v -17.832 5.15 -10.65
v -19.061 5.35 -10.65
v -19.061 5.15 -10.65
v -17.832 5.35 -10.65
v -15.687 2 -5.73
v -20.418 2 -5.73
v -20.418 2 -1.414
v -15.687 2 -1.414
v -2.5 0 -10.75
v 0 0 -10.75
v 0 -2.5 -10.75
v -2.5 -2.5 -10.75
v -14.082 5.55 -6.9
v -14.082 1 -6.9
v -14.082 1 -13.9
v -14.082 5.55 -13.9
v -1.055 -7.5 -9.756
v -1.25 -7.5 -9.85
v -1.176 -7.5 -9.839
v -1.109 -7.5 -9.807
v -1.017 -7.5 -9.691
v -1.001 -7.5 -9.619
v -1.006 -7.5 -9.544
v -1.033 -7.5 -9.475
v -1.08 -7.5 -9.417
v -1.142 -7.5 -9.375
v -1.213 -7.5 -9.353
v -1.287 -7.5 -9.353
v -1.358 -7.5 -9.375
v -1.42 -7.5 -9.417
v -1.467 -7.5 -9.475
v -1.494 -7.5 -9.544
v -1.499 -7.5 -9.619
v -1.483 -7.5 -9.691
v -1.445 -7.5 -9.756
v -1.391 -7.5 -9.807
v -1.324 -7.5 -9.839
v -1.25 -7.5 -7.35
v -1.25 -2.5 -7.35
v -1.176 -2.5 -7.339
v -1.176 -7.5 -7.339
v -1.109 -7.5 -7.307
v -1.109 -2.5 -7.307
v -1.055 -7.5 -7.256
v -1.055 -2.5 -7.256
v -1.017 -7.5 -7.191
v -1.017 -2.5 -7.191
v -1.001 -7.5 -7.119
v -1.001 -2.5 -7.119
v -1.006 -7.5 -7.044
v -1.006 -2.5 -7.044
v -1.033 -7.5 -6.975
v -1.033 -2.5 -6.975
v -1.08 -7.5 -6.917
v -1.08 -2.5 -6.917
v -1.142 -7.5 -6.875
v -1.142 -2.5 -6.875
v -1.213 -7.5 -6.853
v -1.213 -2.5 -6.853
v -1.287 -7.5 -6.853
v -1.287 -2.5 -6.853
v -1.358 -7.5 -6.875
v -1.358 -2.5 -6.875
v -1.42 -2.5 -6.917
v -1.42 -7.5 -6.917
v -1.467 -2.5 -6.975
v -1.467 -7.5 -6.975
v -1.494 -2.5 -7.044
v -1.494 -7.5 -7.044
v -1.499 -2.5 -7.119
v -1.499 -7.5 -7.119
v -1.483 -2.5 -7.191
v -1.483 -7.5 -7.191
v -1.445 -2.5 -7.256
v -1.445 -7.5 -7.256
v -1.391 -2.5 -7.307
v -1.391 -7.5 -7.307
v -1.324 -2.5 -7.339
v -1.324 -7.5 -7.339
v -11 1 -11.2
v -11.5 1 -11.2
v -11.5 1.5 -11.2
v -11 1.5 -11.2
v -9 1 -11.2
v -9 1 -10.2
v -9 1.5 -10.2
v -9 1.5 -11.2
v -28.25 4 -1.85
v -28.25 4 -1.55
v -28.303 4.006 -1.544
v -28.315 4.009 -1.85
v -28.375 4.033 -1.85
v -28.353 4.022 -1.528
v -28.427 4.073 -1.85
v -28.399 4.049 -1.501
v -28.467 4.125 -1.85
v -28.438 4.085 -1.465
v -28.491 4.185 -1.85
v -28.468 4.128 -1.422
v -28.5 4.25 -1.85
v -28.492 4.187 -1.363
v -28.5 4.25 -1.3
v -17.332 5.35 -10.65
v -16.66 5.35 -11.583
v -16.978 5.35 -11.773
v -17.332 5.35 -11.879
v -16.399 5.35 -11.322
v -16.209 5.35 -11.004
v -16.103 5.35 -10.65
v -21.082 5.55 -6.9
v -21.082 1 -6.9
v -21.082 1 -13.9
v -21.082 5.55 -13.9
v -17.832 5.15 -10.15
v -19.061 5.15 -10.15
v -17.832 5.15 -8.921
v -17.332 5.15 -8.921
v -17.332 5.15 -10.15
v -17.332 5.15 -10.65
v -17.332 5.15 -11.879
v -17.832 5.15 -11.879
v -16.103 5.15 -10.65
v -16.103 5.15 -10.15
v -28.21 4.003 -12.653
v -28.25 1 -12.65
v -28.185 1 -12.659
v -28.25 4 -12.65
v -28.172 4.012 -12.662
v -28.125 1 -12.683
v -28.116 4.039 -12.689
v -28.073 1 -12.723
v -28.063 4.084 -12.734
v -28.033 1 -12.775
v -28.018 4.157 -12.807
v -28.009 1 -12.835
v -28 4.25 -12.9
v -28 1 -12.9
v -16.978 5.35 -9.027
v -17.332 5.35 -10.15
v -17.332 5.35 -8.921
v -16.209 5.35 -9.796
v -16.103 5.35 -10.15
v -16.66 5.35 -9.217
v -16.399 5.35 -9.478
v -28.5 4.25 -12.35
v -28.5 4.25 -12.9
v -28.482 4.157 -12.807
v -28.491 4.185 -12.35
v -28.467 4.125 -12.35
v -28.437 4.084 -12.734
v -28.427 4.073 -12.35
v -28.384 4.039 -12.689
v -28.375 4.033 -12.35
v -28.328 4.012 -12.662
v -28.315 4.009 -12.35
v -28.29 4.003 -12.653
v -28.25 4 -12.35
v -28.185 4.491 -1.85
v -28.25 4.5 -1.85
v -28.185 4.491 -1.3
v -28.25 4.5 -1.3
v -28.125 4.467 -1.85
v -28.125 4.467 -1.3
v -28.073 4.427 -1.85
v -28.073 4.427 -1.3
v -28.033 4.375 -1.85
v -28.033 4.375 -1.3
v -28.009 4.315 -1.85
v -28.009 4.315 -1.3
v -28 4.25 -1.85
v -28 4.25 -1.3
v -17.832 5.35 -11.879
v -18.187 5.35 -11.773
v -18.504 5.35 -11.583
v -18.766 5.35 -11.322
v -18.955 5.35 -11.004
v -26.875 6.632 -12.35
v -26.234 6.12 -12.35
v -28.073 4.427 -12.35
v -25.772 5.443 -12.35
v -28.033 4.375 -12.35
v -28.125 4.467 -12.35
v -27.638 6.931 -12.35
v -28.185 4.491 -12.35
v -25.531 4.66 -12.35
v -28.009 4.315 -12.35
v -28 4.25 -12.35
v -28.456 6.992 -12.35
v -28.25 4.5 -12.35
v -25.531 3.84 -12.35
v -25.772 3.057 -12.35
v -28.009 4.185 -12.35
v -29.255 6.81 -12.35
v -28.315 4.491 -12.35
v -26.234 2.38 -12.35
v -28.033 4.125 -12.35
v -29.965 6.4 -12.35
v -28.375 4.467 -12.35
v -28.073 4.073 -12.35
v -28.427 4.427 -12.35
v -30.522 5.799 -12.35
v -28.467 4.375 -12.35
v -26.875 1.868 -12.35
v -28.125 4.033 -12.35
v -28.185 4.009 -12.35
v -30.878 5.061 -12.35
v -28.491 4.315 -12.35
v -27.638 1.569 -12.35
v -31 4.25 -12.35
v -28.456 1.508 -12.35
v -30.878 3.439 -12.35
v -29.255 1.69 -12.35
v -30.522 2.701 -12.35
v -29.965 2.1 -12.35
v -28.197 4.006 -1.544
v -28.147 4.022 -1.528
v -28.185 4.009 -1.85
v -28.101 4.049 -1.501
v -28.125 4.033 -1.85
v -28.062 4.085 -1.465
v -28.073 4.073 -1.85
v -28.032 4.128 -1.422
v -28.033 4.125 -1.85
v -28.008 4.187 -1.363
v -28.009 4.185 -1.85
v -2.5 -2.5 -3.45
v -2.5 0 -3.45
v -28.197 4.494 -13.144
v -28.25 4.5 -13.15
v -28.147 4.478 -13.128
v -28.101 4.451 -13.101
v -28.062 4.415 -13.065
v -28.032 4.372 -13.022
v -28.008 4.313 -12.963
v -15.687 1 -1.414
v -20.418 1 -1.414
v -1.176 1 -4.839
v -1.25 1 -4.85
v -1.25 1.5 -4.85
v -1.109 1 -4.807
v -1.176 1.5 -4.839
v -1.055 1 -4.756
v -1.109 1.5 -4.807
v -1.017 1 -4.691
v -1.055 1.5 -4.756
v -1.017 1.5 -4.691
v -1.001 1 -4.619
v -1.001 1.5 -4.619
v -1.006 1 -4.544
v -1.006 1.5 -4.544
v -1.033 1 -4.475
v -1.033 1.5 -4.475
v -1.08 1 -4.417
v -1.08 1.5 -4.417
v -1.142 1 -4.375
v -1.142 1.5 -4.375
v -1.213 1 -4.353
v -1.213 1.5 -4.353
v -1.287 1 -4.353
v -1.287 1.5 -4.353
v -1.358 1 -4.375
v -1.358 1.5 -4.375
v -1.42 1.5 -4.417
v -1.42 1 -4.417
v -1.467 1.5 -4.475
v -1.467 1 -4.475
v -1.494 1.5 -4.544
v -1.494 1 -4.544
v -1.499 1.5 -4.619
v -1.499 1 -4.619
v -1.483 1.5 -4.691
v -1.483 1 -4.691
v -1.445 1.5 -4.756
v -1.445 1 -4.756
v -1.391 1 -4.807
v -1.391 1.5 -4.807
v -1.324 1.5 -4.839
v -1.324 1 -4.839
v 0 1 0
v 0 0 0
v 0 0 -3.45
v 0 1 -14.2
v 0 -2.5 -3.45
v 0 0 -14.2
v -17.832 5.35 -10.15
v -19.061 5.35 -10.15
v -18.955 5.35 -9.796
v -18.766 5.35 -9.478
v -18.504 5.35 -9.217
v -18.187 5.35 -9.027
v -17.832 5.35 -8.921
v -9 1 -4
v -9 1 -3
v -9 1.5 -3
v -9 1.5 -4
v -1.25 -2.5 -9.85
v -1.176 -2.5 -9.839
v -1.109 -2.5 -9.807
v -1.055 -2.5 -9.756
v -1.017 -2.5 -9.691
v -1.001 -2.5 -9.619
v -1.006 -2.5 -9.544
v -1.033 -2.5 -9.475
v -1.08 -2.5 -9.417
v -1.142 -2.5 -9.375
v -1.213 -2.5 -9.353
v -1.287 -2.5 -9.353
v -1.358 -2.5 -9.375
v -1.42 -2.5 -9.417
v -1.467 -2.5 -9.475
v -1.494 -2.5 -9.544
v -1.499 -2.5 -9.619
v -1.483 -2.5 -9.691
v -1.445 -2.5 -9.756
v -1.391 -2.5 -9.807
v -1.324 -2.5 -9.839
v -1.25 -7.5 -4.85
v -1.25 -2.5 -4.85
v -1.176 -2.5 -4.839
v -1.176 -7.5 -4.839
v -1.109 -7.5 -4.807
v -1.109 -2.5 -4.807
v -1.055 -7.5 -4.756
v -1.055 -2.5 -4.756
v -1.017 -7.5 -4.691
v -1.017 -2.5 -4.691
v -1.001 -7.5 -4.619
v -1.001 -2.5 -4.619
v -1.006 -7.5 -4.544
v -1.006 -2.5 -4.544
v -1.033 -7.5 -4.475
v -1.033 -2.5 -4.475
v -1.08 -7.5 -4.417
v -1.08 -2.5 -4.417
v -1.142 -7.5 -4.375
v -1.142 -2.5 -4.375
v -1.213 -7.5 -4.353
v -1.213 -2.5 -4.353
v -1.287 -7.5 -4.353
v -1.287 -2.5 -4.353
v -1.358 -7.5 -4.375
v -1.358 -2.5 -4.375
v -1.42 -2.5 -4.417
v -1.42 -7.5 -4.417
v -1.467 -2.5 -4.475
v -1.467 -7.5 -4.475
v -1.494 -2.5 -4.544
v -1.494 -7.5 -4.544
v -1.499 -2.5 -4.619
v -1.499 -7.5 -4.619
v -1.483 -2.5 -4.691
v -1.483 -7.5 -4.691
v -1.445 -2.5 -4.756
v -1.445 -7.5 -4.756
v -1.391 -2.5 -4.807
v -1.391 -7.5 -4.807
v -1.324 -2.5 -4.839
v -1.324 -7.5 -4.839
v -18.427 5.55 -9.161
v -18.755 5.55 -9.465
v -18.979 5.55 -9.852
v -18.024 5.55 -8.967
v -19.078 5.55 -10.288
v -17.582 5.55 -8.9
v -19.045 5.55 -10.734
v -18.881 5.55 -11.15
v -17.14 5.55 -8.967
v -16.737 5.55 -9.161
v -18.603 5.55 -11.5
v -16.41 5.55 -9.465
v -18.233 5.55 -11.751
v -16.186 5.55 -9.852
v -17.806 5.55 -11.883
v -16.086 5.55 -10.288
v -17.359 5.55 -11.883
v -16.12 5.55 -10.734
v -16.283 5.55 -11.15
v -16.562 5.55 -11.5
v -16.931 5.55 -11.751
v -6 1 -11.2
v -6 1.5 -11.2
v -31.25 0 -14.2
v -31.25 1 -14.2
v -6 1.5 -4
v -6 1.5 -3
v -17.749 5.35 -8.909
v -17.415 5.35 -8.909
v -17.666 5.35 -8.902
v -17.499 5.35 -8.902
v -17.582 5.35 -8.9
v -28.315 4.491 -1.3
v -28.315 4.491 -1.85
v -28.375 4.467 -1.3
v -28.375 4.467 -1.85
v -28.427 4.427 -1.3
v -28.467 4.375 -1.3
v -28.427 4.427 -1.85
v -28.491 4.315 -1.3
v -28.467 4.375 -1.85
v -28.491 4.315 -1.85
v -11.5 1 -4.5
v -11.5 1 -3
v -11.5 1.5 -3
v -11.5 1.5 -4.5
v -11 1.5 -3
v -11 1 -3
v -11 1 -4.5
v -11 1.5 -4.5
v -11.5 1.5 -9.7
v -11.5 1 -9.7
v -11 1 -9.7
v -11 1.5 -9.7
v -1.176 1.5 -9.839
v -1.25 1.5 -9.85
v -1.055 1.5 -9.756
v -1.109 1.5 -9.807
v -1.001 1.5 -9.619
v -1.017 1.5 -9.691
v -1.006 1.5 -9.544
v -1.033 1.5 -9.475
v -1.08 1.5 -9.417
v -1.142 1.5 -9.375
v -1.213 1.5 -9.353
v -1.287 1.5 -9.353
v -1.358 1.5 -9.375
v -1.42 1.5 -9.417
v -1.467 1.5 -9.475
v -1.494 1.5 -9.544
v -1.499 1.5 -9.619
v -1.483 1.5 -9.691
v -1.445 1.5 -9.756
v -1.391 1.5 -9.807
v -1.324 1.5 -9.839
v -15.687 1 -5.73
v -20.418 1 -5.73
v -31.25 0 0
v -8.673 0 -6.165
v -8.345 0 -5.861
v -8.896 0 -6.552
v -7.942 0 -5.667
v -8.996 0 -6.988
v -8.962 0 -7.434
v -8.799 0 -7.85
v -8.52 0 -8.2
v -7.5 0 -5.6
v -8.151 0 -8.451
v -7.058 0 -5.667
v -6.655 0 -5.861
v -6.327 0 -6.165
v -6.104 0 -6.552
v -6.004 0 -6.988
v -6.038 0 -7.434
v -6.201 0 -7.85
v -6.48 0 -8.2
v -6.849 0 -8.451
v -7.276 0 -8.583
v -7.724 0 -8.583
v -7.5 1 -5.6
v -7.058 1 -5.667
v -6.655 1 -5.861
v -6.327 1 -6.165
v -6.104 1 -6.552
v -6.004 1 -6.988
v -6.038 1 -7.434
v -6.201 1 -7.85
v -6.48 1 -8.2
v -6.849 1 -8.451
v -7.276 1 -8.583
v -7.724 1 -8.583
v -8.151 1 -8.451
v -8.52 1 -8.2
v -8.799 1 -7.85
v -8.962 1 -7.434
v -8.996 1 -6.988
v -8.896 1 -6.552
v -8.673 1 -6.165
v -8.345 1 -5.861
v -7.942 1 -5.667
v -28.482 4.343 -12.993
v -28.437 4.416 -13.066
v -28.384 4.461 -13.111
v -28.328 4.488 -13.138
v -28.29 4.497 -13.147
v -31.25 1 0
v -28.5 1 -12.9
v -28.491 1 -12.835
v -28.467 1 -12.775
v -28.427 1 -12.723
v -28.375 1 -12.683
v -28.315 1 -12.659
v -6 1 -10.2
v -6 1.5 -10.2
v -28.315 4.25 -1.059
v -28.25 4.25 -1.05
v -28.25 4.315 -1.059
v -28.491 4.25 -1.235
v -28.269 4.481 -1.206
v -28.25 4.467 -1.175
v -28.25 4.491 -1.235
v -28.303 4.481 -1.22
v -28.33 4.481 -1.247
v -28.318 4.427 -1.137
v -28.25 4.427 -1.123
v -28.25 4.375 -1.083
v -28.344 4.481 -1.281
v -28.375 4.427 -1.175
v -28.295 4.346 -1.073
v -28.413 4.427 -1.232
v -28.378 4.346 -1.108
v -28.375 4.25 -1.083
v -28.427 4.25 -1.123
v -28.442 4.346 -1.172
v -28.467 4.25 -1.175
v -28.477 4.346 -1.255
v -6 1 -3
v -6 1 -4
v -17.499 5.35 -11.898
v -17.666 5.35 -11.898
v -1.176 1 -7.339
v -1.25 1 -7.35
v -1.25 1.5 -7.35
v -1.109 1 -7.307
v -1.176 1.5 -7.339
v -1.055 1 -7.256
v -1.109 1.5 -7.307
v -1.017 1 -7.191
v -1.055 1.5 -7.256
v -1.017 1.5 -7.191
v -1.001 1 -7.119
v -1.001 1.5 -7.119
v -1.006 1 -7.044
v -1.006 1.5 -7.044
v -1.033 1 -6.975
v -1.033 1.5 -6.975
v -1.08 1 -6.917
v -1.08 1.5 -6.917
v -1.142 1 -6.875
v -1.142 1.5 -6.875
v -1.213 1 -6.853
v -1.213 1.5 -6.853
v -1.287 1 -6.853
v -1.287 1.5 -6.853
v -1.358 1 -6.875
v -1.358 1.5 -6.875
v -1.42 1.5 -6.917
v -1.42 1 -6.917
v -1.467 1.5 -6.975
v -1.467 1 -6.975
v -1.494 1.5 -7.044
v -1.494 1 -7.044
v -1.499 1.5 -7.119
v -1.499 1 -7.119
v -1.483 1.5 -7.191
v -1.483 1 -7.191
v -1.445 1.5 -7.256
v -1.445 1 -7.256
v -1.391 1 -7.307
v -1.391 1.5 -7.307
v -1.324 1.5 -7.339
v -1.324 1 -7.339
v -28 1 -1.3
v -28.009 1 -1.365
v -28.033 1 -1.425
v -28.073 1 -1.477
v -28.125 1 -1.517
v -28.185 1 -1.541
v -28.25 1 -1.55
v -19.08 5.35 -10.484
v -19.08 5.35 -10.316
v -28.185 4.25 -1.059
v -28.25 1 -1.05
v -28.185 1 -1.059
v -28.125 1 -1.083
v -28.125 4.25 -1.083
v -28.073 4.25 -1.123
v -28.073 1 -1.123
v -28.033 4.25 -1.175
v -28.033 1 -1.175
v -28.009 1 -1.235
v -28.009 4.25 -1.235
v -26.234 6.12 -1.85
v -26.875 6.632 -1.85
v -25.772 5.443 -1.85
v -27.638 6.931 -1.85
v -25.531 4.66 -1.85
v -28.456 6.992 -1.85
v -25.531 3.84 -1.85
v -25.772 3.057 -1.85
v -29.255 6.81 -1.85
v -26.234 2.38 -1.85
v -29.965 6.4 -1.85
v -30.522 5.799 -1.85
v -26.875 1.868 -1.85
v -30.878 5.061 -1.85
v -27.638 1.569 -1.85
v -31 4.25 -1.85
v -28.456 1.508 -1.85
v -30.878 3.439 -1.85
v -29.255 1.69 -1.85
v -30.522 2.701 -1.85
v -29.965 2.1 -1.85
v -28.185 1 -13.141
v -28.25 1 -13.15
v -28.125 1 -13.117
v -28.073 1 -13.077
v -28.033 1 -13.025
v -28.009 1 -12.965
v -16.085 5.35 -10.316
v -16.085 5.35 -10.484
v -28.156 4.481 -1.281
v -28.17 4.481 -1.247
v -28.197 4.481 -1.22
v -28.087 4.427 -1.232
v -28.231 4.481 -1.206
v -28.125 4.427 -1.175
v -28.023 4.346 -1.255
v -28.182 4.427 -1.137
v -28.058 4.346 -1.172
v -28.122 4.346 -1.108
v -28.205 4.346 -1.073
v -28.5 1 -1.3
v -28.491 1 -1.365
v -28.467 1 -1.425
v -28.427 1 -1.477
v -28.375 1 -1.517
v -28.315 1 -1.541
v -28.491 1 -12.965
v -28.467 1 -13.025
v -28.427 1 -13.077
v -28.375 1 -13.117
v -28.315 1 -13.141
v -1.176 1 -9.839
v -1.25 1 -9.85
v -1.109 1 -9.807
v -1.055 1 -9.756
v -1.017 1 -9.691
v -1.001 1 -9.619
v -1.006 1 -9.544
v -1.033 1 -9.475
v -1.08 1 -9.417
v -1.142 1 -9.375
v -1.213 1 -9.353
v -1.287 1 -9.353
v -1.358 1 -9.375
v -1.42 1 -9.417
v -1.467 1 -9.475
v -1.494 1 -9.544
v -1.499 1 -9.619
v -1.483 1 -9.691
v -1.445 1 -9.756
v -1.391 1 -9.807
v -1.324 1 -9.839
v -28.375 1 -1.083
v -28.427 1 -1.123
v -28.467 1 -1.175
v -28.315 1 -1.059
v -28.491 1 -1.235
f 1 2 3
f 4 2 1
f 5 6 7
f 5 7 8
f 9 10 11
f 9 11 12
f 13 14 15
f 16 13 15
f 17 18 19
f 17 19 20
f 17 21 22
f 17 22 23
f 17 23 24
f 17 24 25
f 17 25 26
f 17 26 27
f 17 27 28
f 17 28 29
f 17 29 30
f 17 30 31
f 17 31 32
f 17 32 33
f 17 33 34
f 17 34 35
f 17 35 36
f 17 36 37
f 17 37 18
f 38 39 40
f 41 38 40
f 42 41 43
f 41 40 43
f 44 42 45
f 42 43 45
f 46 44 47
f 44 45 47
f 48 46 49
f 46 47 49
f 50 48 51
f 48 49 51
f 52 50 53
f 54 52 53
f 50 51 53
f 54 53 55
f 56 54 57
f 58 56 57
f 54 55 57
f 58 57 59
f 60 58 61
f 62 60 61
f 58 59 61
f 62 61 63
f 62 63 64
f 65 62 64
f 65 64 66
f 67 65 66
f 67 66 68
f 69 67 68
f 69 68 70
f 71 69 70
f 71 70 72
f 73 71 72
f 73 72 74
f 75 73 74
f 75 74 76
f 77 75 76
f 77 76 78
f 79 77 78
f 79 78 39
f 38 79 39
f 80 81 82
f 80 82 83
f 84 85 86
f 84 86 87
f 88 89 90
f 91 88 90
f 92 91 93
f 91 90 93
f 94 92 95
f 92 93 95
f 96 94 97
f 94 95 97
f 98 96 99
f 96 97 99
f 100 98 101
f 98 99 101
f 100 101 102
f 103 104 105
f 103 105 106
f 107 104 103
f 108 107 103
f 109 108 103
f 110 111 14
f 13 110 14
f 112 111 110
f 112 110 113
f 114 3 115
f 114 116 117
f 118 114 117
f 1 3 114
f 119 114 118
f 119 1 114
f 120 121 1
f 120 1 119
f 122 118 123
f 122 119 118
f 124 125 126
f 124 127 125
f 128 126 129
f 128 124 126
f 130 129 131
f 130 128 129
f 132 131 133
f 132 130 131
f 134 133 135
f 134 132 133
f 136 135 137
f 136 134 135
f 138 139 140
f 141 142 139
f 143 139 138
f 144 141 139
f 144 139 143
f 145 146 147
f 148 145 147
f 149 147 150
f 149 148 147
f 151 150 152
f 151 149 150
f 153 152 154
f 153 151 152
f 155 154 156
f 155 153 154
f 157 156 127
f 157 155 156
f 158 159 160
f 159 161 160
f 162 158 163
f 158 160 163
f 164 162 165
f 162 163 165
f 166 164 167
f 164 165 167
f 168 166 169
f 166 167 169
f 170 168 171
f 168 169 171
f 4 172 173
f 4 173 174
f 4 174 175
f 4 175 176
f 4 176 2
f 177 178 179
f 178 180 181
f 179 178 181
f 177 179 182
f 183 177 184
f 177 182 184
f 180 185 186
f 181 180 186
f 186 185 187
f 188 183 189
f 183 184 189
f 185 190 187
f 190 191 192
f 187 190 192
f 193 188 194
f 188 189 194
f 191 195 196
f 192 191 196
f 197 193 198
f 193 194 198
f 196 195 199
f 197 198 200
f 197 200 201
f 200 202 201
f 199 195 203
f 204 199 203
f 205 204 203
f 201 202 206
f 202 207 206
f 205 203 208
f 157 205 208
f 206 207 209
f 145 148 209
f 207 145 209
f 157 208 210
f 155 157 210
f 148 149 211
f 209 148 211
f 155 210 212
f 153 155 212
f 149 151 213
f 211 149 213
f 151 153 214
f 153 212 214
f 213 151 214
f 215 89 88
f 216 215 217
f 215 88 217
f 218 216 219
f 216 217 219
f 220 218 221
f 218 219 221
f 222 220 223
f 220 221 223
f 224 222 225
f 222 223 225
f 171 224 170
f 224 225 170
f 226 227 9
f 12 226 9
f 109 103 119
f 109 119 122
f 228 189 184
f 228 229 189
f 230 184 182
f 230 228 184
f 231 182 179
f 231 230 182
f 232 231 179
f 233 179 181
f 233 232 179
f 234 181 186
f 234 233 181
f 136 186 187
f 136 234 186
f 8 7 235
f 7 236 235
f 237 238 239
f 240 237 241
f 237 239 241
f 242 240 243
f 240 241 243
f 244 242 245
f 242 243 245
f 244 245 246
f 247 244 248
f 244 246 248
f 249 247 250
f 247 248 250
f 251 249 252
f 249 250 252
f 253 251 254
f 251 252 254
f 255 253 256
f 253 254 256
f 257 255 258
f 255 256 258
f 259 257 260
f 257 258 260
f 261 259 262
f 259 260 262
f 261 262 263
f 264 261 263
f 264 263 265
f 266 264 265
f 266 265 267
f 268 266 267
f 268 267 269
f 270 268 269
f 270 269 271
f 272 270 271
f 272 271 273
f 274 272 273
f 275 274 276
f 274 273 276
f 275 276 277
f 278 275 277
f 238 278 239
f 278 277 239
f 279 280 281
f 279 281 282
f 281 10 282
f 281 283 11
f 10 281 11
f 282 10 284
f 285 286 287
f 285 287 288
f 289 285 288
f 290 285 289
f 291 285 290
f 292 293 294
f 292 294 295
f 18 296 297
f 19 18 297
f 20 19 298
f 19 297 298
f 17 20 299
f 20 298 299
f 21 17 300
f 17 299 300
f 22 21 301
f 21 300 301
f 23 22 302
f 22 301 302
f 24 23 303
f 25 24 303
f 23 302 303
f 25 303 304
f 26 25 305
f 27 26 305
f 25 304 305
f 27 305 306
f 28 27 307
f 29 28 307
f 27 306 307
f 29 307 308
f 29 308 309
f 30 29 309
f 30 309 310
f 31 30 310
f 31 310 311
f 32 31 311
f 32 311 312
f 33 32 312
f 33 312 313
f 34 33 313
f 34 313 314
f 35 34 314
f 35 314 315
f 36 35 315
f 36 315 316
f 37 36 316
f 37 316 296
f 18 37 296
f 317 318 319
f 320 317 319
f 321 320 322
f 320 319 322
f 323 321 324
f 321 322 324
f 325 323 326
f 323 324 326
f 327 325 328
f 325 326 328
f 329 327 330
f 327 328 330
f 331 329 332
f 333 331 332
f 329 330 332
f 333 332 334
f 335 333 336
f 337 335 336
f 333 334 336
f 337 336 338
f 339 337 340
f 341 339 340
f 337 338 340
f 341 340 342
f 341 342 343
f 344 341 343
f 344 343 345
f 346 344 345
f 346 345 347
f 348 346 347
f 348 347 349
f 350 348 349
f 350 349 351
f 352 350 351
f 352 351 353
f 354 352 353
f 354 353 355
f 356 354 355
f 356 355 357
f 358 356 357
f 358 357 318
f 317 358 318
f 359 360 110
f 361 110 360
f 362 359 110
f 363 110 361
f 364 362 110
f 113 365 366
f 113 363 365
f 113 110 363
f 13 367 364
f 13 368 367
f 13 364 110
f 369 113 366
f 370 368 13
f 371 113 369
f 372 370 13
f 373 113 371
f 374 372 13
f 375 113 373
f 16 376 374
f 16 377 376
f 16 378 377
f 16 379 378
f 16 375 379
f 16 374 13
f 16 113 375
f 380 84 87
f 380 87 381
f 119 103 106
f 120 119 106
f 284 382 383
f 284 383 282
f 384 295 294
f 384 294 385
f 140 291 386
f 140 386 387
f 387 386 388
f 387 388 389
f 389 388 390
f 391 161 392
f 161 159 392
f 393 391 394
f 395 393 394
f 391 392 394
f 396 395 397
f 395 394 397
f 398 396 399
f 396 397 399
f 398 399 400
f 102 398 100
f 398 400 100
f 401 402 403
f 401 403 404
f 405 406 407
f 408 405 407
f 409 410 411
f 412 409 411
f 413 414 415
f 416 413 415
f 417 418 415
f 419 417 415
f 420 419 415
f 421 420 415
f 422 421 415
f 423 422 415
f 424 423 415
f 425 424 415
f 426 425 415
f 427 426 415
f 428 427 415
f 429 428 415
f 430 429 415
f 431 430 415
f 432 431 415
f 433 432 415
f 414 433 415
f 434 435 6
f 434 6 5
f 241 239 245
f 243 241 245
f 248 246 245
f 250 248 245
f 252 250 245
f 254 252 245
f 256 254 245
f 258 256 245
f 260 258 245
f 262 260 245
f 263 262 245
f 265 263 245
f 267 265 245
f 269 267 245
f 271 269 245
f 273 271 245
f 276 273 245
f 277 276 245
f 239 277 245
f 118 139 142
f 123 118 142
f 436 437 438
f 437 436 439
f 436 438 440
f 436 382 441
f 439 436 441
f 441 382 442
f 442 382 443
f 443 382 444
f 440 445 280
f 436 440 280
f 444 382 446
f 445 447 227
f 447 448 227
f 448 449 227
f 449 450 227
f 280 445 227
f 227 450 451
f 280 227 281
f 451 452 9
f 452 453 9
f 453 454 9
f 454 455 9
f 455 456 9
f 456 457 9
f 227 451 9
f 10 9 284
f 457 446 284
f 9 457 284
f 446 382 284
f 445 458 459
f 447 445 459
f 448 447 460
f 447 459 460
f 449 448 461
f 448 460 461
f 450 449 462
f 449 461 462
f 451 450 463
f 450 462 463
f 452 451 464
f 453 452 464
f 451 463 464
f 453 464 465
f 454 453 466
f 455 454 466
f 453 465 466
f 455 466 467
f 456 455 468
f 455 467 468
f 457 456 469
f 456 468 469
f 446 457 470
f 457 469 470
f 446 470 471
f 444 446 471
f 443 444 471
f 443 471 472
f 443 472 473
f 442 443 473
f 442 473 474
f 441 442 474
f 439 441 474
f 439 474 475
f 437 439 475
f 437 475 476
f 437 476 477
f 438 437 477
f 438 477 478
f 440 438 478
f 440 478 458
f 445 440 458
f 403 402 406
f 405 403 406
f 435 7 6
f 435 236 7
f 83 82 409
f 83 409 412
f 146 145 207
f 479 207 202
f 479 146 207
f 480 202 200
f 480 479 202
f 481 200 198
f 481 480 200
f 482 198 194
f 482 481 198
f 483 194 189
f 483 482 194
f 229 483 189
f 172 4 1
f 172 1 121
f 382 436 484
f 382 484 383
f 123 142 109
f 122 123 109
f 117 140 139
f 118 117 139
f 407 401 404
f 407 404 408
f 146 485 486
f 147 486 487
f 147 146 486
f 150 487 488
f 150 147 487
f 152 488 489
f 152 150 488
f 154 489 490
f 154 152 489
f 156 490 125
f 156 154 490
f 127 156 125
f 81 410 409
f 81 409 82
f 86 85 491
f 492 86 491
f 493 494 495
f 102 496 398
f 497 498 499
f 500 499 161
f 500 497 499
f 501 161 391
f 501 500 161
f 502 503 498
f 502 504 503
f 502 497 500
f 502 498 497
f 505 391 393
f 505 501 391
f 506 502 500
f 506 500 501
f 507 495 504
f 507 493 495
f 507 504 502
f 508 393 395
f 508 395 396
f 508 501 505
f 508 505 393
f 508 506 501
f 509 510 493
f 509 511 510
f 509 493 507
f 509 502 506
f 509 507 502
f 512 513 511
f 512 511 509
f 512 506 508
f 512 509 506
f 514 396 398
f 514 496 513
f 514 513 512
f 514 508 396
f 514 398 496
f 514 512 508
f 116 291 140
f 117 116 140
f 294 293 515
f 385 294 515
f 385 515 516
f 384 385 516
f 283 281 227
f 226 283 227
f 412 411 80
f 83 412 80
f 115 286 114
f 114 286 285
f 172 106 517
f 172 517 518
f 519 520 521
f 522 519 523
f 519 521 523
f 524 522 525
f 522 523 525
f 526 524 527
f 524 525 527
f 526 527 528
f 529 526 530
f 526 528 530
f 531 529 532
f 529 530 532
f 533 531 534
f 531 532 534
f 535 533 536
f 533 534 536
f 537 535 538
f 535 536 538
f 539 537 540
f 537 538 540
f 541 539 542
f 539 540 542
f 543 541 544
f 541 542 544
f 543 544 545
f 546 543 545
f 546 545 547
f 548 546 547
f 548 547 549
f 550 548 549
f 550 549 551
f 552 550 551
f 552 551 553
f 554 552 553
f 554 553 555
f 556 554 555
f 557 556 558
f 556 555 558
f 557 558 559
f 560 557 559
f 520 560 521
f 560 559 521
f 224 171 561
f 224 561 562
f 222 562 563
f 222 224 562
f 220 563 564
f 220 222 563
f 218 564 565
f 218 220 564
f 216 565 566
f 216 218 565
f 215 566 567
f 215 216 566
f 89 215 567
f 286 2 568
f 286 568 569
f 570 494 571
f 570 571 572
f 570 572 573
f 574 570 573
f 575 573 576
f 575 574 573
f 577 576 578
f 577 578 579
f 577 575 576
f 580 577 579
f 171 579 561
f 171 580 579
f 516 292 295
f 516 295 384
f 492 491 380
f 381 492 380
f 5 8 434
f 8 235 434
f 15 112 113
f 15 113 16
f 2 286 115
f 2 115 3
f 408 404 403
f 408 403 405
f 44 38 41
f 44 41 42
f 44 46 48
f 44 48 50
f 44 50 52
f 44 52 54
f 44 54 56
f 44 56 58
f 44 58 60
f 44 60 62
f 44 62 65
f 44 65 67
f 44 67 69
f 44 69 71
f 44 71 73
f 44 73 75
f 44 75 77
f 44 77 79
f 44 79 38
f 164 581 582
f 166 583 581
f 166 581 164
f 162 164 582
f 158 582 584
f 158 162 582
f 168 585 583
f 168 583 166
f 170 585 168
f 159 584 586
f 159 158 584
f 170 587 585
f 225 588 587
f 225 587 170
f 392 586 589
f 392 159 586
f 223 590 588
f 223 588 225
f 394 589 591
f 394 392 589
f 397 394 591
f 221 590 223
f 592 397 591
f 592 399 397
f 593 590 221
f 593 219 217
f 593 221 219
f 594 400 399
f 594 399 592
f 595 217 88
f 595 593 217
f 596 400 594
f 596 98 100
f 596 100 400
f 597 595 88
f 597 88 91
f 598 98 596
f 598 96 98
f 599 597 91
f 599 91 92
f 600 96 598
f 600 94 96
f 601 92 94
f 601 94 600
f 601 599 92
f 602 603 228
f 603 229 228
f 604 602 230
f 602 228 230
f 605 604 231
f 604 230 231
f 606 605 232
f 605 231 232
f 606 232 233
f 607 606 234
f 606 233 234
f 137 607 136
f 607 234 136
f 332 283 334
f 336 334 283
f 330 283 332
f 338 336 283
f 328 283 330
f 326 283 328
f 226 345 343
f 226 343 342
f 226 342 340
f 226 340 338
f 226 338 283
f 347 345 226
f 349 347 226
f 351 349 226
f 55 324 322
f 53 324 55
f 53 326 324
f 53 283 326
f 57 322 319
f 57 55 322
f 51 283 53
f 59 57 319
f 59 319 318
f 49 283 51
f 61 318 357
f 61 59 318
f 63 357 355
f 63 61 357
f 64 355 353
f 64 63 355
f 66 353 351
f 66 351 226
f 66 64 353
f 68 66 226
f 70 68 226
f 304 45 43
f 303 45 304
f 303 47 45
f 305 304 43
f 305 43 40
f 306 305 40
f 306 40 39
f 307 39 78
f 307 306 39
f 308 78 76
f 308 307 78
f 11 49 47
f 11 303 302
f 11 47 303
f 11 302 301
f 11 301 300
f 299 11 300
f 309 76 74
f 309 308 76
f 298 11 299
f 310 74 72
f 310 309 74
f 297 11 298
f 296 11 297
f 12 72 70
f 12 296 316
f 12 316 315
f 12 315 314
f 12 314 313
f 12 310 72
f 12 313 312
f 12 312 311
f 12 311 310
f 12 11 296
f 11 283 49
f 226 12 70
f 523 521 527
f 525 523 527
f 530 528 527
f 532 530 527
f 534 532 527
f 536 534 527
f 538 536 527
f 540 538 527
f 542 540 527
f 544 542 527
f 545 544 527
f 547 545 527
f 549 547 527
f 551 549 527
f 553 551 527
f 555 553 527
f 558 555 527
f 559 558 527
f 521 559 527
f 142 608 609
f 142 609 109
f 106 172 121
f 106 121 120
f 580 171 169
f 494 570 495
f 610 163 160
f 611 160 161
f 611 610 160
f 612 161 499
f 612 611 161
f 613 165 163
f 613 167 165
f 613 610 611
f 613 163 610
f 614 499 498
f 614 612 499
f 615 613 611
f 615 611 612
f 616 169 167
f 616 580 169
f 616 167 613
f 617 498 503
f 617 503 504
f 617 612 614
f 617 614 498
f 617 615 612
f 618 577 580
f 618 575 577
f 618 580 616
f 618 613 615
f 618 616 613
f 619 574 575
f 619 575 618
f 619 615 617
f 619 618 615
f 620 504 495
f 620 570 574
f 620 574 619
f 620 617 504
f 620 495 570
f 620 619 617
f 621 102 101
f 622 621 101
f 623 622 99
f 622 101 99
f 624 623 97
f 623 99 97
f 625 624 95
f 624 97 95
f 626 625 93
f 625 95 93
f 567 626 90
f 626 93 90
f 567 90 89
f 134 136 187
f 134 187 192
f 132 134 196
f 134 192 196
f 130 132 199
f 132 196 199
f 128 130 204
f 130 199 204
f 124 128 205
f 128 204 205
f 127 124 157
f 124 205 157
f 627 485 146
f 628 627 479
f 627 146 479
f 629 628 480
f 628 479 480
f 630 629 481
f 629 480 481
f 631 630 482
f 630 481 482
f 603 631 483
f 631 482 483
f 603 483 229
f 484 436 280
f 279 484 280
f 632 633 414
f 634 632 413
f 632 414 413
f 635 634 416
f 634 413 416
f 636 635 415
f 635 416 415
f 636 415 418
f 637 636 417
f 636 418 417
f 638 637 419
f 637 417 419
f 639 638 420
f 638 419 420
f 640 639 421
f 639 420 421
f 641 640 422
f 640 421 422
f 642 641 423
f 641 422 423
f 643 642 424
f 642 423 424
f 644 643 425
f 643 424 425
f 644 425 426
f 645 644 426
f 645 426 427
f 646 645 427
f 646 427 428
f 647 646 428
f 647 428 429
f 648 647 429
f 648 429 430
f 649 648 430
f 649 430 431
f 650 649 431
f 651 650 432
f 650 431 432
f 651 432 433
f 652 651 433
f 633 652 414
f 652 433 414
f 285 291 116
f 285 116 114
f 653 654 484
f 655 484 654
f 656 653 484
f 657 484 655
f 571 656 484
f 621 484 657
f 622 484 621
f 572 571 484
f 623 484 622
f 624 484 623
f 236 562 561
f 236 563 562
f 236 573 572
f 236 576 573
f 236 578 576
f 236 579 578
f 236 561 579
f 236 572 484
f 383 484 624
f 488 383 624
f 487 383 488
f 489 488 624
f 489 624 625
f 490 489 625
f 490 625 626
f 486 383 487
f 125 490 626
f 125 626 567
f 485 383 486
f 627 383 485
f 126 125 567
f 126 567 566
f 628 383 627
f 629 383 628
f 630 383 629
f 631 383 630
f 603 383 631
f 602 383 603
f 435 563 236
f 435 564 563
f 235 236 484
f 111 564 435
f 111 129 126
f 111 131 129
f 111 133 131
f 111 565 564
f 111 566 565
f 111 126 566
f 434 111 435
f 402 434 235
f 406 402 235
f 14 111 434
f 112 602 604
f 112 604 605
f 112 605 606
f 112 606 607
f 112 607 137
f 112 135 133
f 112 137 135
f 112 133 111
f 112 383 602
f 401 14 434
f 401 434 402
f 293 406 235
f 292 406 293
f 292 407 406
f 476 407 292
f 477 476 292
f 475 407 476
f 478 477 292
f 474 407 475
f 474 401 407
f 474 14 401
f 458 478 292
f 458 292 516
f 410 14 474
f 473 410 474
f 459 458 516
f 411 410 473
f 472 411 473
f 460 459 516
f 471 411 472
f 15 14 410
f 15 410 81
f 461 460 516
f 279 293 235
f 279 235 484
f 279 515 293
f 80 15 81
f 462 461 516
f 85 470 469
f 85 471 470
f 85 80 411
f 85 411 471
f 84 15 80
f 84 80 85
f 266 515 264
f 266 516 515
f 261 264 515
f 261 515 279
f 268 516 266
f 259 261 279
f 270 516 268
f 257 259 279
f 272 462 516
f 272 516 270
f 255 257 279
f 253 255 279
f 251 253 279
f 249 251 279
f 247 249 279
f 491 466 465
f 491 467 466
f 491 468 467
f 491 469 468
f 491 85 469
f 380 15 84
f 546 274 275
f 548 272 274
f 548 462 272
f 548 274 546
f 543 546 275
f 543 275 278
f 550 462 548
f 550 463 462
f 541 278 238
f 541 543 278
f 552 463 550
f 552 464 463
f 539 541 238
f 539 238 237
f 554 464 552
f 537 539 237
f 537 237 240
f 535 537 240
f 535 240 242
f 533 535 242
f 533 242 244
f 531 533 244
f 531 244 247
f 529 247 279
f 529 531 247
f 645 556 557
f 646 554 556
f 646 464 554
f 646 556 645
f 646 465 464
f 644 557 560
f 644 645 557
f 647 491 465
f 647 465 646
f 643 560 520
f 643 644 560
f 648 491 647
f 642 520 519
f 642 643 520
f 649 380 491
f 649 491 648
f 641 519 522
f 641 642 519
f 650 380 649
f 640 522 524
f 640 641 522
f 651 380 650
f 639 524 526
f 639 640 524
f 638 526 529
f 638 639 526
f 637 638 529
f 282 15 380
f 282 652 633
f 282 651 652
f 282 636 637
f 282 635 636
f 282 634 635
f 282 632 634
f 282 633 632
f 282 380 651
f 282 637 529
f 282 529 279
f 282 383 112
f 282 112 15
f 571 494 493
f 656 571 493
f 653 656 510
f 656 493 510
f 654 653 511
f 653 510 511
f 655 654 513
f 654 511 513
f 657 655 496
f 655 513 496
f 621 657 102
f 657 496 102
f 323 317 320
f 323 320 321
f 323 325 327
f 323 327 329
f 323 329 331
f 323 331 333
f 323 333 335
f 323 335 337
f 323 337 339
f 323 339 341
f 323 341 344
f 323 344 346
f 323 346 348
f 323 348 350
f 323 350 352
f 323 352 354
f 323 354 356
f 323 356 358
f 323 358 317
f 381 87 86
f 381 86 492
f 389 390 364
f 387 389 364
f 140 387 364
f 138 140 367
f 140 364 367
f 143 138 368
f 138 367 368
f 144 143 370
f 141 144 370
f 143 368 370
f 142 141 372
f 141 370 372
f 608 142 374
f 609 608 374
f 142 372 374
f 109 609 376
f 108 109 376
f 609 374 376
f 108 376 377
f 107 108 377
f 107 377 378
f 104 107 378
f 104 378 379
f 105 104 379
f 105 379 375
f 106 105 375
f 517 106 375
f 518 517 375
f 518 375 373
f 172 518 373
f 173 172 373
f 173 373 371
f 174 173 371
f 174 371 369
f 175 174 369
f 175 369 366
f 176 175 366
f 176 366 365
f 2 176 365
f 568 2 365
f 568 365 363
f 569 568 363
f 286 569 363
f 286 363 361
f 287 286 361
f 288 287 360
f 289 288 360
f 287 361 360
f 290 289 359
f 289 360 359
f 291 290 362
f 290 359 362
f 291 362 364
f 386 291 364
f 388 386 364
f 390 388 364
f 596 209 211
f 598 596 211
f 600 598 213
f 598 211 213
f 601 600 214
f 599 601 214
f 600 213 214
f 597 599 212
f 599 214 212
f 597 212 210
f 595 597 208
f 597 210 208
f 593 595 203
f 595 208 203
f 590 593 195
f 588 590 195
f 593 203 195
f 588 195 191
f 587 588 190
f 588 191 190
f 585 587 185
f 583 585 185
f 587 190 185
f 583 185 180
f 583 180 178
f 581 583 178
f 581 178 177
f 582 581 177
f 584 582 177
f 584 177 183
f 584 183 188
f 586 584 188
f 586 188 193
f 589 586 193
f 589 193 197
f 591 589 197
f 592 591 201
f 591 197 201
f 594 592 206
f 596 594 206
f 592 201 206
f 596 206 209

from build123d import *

# Parameters (mm, degrees)
ESQUISSE1_W              = 31.25
ESQUISSE1_H              = 14.2
BOSS_EXTRU_1_DEPTH       = 1
ESQUISSE2_W              = 0.5
ESQUISSE2_H              = 0.5
BOSS_EXTRU_2_DEPTH       = 3.5
ESQUISSE3_W              = 0.5
ESQUISSE3_H              = 0.5
BOSS_EXTRU_3_DEPTH       = 0.3
ESQUISSE4_W              = 0.5
ESQUISSE4_H              = 0.5
BOSS_EXTRU_4_DEPTH       = 0.3
ESQUISSE5_R              = 2.75
BOSS_EXTRU_5_DEPTH       = 10.5
ESQUISSE6_W              = 7
ESQUISSE6_H              = 7
BOSS_EXTRU_6_DEPTH       = 4.55
ESQUISSE7_R              = 1.5
ENL_V_MAT_EXTRU_1_DEPTH  = 0.2
ESQUISSE8_W              = 1.229019946
ESQUISSE8_H              = 0.5
ESQUISSE8_W_2            = 0.5
ESQUISSE8_H_2            = 1.229019946
ENL_V_MAT_EXTRU_2_DEPTH  = 0.2
ESQUISSE9_W              = 4.73100796
ESQUISSE9_H              = 4.316007262
ESQUISSE9_W_2            = 3
ESQUISSE9_H_2            = 1
ESQUISSE9_W_3            = 0.5
ESQUISSE9_H_3            = 1.5
BOSS_EXTRU_7_DEPTH       = 0.5
ESQUISSE10_W             = 4.73100796
ESQUISSE10_H             = 4.316007262
BOSS_EXTRU_8_DEPTH       = 0.5
ESQUISSE11_R             = 1.5
ENL_V_MAT_EXTRU_3_DEPTH  = 22.5
ESQUISSE12_W             = 2.5
ESQUISSE12_H             = 7.3
BOSS_EXTRU_9_DEPTH       = 2.5
BOSS_EXTRU_10_DEPTH      = 5
BOSS_EXTRU_10_DEPTH_BACK = 4
ESQUISSE13_R             = 0.25
CONG_1_R                 = 0.25
CONG_2_R                 = 0.25
CONG_3_R                 = 0.25


with BuildPart() as part:
    # Esquisse1 → Boss.-Extru.1 (new body)
    with BuildSketch(Plane(origin=(0, 0, 0), x_dir=(1, 0, 0), z_dir=(0, 1, 0))):
        with Locations((-15.625, 7.1)):
            Rectangle(ESQUISSE1_W, ESQUISSE1_H)
    extrude(amount=BOSS_EXTRU_1_DEPTH)

    # Esquisse2 → Boss.-Extru.2 (add)
    with BuildSketch(Plane(origin=(0, 1, 0), x_dir=(1, 0, 0), z_dir=(0, 1, 0))):
        with Locations((-28.25, 12.9)):
            Rectangle(ESQUISSE2_W, ESQUISSE2_H)
        with Locations((-28.25, 1.3)):
            Rectangle(ESQUISSE2_W, ESQUISSE2_H)
    extrude(amount=BOSS_EXTRU_2_DEPTH)

    # Esquisse3 → Boss.-Extru.3 (add)
    with BuildSketch(Plane.XY.offset(-12.65)):
        with Locations((-28.25, 4.25)):
            Rectangle(ESQUISSE3_W, ESQUISSE3_H)
    extrude(amount=BOSS_EXTRU_3_DEPTH)

    # Esquisse4 → Boss.-Extru.4 (add)
    with BuildSketch(Plane(origin=(0, 0, -1.55), x_dir=(-1, 0, 0), z_dir=(0, 0, -1))):
        with Locations((28.25, 4.25)):
            Rectangle(ESQUISSE4_W, ESQUISSE4_H)
    extrude(amount=BOSS_EXTRU_4_DEPTH)

    # Esquisse5 → Boss.-Extru.5 (add)
    with BuildSketch(Plane.XY.offset(-12.35)):
        with Locations(Location((-28.25, 4.25, 0), (0, 0, 180))):
            Circle(ESQUISSE5_R)
    extrude(amount=BOSS_EXTRU_5_DEPTH)

    # Esquisse6 → Boss.-Extru.6 (add)
    with BuildSketch(Plane(origin=(0, 1, 0), x_dir=(1, 0, 0), z_dir=(0, 1, 0))):
        with Locations((-17.582259182, 10.4)):
            Rectangle(ESQUISSE6_W, ESQUISSE6_H)
    extrude(amount=BOSS_EXTRU_6_DEPTH)

    # Esquisse7 → Enlèv. mat.-Extru.1 (cut)
    with BuildSketch(Plane(origin=(0, 5.55, 0), x_dir=(1, 0, 0), z_dir=(0, 1, 0))):
        with Locations(Location((-17.582259182, 10.4, 0), (0, 0, 270))):
            Circle(ESQUISSE7_R)
    extrude(amount=-ENL_V_MAT_EXTRU_1_DEPTH, mode=Mode.SUBTRACT)

    # Esquisse8 → Enlèv. mat.-Extru.2 (cut)
    with BuildSketch(Plane(origin=(0, 5.35, 0), x_dir=(1, 0, 0), z_dir=(0, 1, 0))):
        with Locations((-18.446769155, 10.4)):
            Rectangle(ESQUISSE8_W, ESQUISSE8_H)
        with Locations((-17.582259182, 9.535490027)):
            Rectangle(ESQUISSE8_W_2, ESQUISSE8_H_2)
        with Locations((-16.717749209, 10.4)):
            Rectangle(ESQUISSE8_W, ESQUISSE8_H)
        with Locations((-17.582259182, 11.264509973)):
            Rectangle(ESQUISSE8_W_2, ESQUISSE8_H_2)
        with Locations((-17.582259182, 10.4)):
            Rectangle(ESQUISSE8_W_2, ESQUISSE8_H)
    extrude(amount=-ENL_V_MAT_EXTRU_2_DEPTH, mode=Mode.SUBTRACT)

    # Esquisse9 → Boss.-Extru.7 (add)
    with BuildSketch(Plane(origin=(0, 1, 0), x_dir=(1, 0, 0), z_dir=(0, 1, 0))):
        with Locations((-18.052754085, 3.572494065)):
            Rectangle(ESQUISSE9_W, ESQUISSE9_H)
        with Locations((-7.5, 3.5)):
            Rectangle(ESQUISSE9_W_2, ESQUISSE9_H_2)
        with Locations((-7.5, 10.7)):
            Rectangle(ESQUISSE9_W_2, ESQUISSE9_H_2)
        with Locations((-11.25, 3.75)):
            Rectangle(ESQUISSE9_W_3, ESQUISSE9_H_3)
        with Locations((-11.25, 10.45)):
            Rectangle(ESQUISSE9_W_3, ESQUISSE9_H_3)
    extrude(amount=BOSS_EXTRU_7_DEPTH)

    # Esquisse10 → Boss.-Extru.8 (add)
    with BuildSketch(Plane(origin=(0, 1.5, 0), x_dir=(1, 0, 0), z_dir=(0, 1, 0))):
        with Locations((-18.052754085, 3.572494065)):
            Rectangle(ESQUISSE10_W, ESQUISSE10_H)
    extrude(amount=BOSS_EXTRU_8_DEPTH)

    # Esquisse11 → Enlèv. mat.-Extru.3 (cut)
    with BuildSketch(Plane(origin=(0, 1, 0), x_dir=(1, 0, 0), z_dir=(0, 1, 0))):
        with Locations(Location((-7.5, 7.1, 0), (0, 0, 270))):
            Circle(ESQUISSE11_R)
    extrude(amount=-ENL_V_MAT_EXTRU_3_DEPTH, mode=Mode.SUBTRACT)

    # Esquisse12 → Boss.-Extru.9 (add)
    with BuildSketch(Plane(origin=(0, 0, 0), x_dir=(-1, 0, 0), z_dir=(0, -1, 0))):
        with Locations((1.25, 7.1)):
            Rectangle(ESQUISSE12_W, ESQUISSE12_H)
    extrude(amount=BOSS_EXTRU_9_DEPTH)

    # Esquisse13 → Boss.-Extru.10 (add, two sides: drawn at the far end of the back side and taken through both)
    with BuildSketch(Plane(origin=(0, -2.5, 0), x_dir=(-1, 0, 0), z_dir=(0, -1, 0)).offset(-BOSS_EXTRU_10_DEPTH_BACK)):
        with Locations(Location((1.25, 9.6, 0), (0, 0, 90))):
            Circle(ESQUISSE13_R)
        with Locations(Location((1.25, 7.1, 0), (0, 0, 90))):
            Circle(ESQUISSE13_R)
        with Locations(Location((1.25, 4.6, 0), (0, 0, 90))):
            Circle(ESQUISSE13_R)
    extrude(amount=BOSS_EXTRU_10_DEPTH + BOSS_EXTRU_10_DEPTH_BACK)

    # Congé1
    cong_1_edges = [part.edges().sort_by_distance(p)[0] for p in [
        (-28.5, 2.5, -1.55),
        (-28, 2.75, -1.05),
        (-28, 2.5, -1.55),
        (-28.5, 2.75, -1.05),
    ]]
    fillet(cong_1_edges, radius=CONG_1_R - 0.0001)  # a hair under: the kernel refuses the full size

    # Congé2
    cong_2_edges = [part.edges().sort_by_distance(p)[0] for p in [
        (-28.5, 4, -1.57505),
        (-28, 4, -1.57505),
        (-28.426805985, 4.5, -1.123194015),
        (-28.073194015, 4.5, -1.123194015),
        (-28.5, 4.5, -1.57495),
        (-28, 4.5, -1.57495),
    ]]
    fillet(cong_2_edges, radius=CONG_2_R - 0.0001)  # a hair under: the kernel refuses the full size

    # Congé3
    cong_3_edges = [part.edges().sort_by_distance(p)[0] for p in [
        (-28, 4, -12.5),
        (-28, 2.5, -12.65),
        (-28, 2.75, -13.15),
        (-28, 4.5, -12.75),
        (-28.5, 2.5, -12.65),
        (-28.5, 4, -12.5),
        (-28.5, 4.5, -12.75),
        (-28.5, 2.75, -13.15),
    ]]
    fillet(cong_3_edges, radius=CONG_3_R - 0.0001)  # a hair under: the kernel refuses the full size


solid = part.part
